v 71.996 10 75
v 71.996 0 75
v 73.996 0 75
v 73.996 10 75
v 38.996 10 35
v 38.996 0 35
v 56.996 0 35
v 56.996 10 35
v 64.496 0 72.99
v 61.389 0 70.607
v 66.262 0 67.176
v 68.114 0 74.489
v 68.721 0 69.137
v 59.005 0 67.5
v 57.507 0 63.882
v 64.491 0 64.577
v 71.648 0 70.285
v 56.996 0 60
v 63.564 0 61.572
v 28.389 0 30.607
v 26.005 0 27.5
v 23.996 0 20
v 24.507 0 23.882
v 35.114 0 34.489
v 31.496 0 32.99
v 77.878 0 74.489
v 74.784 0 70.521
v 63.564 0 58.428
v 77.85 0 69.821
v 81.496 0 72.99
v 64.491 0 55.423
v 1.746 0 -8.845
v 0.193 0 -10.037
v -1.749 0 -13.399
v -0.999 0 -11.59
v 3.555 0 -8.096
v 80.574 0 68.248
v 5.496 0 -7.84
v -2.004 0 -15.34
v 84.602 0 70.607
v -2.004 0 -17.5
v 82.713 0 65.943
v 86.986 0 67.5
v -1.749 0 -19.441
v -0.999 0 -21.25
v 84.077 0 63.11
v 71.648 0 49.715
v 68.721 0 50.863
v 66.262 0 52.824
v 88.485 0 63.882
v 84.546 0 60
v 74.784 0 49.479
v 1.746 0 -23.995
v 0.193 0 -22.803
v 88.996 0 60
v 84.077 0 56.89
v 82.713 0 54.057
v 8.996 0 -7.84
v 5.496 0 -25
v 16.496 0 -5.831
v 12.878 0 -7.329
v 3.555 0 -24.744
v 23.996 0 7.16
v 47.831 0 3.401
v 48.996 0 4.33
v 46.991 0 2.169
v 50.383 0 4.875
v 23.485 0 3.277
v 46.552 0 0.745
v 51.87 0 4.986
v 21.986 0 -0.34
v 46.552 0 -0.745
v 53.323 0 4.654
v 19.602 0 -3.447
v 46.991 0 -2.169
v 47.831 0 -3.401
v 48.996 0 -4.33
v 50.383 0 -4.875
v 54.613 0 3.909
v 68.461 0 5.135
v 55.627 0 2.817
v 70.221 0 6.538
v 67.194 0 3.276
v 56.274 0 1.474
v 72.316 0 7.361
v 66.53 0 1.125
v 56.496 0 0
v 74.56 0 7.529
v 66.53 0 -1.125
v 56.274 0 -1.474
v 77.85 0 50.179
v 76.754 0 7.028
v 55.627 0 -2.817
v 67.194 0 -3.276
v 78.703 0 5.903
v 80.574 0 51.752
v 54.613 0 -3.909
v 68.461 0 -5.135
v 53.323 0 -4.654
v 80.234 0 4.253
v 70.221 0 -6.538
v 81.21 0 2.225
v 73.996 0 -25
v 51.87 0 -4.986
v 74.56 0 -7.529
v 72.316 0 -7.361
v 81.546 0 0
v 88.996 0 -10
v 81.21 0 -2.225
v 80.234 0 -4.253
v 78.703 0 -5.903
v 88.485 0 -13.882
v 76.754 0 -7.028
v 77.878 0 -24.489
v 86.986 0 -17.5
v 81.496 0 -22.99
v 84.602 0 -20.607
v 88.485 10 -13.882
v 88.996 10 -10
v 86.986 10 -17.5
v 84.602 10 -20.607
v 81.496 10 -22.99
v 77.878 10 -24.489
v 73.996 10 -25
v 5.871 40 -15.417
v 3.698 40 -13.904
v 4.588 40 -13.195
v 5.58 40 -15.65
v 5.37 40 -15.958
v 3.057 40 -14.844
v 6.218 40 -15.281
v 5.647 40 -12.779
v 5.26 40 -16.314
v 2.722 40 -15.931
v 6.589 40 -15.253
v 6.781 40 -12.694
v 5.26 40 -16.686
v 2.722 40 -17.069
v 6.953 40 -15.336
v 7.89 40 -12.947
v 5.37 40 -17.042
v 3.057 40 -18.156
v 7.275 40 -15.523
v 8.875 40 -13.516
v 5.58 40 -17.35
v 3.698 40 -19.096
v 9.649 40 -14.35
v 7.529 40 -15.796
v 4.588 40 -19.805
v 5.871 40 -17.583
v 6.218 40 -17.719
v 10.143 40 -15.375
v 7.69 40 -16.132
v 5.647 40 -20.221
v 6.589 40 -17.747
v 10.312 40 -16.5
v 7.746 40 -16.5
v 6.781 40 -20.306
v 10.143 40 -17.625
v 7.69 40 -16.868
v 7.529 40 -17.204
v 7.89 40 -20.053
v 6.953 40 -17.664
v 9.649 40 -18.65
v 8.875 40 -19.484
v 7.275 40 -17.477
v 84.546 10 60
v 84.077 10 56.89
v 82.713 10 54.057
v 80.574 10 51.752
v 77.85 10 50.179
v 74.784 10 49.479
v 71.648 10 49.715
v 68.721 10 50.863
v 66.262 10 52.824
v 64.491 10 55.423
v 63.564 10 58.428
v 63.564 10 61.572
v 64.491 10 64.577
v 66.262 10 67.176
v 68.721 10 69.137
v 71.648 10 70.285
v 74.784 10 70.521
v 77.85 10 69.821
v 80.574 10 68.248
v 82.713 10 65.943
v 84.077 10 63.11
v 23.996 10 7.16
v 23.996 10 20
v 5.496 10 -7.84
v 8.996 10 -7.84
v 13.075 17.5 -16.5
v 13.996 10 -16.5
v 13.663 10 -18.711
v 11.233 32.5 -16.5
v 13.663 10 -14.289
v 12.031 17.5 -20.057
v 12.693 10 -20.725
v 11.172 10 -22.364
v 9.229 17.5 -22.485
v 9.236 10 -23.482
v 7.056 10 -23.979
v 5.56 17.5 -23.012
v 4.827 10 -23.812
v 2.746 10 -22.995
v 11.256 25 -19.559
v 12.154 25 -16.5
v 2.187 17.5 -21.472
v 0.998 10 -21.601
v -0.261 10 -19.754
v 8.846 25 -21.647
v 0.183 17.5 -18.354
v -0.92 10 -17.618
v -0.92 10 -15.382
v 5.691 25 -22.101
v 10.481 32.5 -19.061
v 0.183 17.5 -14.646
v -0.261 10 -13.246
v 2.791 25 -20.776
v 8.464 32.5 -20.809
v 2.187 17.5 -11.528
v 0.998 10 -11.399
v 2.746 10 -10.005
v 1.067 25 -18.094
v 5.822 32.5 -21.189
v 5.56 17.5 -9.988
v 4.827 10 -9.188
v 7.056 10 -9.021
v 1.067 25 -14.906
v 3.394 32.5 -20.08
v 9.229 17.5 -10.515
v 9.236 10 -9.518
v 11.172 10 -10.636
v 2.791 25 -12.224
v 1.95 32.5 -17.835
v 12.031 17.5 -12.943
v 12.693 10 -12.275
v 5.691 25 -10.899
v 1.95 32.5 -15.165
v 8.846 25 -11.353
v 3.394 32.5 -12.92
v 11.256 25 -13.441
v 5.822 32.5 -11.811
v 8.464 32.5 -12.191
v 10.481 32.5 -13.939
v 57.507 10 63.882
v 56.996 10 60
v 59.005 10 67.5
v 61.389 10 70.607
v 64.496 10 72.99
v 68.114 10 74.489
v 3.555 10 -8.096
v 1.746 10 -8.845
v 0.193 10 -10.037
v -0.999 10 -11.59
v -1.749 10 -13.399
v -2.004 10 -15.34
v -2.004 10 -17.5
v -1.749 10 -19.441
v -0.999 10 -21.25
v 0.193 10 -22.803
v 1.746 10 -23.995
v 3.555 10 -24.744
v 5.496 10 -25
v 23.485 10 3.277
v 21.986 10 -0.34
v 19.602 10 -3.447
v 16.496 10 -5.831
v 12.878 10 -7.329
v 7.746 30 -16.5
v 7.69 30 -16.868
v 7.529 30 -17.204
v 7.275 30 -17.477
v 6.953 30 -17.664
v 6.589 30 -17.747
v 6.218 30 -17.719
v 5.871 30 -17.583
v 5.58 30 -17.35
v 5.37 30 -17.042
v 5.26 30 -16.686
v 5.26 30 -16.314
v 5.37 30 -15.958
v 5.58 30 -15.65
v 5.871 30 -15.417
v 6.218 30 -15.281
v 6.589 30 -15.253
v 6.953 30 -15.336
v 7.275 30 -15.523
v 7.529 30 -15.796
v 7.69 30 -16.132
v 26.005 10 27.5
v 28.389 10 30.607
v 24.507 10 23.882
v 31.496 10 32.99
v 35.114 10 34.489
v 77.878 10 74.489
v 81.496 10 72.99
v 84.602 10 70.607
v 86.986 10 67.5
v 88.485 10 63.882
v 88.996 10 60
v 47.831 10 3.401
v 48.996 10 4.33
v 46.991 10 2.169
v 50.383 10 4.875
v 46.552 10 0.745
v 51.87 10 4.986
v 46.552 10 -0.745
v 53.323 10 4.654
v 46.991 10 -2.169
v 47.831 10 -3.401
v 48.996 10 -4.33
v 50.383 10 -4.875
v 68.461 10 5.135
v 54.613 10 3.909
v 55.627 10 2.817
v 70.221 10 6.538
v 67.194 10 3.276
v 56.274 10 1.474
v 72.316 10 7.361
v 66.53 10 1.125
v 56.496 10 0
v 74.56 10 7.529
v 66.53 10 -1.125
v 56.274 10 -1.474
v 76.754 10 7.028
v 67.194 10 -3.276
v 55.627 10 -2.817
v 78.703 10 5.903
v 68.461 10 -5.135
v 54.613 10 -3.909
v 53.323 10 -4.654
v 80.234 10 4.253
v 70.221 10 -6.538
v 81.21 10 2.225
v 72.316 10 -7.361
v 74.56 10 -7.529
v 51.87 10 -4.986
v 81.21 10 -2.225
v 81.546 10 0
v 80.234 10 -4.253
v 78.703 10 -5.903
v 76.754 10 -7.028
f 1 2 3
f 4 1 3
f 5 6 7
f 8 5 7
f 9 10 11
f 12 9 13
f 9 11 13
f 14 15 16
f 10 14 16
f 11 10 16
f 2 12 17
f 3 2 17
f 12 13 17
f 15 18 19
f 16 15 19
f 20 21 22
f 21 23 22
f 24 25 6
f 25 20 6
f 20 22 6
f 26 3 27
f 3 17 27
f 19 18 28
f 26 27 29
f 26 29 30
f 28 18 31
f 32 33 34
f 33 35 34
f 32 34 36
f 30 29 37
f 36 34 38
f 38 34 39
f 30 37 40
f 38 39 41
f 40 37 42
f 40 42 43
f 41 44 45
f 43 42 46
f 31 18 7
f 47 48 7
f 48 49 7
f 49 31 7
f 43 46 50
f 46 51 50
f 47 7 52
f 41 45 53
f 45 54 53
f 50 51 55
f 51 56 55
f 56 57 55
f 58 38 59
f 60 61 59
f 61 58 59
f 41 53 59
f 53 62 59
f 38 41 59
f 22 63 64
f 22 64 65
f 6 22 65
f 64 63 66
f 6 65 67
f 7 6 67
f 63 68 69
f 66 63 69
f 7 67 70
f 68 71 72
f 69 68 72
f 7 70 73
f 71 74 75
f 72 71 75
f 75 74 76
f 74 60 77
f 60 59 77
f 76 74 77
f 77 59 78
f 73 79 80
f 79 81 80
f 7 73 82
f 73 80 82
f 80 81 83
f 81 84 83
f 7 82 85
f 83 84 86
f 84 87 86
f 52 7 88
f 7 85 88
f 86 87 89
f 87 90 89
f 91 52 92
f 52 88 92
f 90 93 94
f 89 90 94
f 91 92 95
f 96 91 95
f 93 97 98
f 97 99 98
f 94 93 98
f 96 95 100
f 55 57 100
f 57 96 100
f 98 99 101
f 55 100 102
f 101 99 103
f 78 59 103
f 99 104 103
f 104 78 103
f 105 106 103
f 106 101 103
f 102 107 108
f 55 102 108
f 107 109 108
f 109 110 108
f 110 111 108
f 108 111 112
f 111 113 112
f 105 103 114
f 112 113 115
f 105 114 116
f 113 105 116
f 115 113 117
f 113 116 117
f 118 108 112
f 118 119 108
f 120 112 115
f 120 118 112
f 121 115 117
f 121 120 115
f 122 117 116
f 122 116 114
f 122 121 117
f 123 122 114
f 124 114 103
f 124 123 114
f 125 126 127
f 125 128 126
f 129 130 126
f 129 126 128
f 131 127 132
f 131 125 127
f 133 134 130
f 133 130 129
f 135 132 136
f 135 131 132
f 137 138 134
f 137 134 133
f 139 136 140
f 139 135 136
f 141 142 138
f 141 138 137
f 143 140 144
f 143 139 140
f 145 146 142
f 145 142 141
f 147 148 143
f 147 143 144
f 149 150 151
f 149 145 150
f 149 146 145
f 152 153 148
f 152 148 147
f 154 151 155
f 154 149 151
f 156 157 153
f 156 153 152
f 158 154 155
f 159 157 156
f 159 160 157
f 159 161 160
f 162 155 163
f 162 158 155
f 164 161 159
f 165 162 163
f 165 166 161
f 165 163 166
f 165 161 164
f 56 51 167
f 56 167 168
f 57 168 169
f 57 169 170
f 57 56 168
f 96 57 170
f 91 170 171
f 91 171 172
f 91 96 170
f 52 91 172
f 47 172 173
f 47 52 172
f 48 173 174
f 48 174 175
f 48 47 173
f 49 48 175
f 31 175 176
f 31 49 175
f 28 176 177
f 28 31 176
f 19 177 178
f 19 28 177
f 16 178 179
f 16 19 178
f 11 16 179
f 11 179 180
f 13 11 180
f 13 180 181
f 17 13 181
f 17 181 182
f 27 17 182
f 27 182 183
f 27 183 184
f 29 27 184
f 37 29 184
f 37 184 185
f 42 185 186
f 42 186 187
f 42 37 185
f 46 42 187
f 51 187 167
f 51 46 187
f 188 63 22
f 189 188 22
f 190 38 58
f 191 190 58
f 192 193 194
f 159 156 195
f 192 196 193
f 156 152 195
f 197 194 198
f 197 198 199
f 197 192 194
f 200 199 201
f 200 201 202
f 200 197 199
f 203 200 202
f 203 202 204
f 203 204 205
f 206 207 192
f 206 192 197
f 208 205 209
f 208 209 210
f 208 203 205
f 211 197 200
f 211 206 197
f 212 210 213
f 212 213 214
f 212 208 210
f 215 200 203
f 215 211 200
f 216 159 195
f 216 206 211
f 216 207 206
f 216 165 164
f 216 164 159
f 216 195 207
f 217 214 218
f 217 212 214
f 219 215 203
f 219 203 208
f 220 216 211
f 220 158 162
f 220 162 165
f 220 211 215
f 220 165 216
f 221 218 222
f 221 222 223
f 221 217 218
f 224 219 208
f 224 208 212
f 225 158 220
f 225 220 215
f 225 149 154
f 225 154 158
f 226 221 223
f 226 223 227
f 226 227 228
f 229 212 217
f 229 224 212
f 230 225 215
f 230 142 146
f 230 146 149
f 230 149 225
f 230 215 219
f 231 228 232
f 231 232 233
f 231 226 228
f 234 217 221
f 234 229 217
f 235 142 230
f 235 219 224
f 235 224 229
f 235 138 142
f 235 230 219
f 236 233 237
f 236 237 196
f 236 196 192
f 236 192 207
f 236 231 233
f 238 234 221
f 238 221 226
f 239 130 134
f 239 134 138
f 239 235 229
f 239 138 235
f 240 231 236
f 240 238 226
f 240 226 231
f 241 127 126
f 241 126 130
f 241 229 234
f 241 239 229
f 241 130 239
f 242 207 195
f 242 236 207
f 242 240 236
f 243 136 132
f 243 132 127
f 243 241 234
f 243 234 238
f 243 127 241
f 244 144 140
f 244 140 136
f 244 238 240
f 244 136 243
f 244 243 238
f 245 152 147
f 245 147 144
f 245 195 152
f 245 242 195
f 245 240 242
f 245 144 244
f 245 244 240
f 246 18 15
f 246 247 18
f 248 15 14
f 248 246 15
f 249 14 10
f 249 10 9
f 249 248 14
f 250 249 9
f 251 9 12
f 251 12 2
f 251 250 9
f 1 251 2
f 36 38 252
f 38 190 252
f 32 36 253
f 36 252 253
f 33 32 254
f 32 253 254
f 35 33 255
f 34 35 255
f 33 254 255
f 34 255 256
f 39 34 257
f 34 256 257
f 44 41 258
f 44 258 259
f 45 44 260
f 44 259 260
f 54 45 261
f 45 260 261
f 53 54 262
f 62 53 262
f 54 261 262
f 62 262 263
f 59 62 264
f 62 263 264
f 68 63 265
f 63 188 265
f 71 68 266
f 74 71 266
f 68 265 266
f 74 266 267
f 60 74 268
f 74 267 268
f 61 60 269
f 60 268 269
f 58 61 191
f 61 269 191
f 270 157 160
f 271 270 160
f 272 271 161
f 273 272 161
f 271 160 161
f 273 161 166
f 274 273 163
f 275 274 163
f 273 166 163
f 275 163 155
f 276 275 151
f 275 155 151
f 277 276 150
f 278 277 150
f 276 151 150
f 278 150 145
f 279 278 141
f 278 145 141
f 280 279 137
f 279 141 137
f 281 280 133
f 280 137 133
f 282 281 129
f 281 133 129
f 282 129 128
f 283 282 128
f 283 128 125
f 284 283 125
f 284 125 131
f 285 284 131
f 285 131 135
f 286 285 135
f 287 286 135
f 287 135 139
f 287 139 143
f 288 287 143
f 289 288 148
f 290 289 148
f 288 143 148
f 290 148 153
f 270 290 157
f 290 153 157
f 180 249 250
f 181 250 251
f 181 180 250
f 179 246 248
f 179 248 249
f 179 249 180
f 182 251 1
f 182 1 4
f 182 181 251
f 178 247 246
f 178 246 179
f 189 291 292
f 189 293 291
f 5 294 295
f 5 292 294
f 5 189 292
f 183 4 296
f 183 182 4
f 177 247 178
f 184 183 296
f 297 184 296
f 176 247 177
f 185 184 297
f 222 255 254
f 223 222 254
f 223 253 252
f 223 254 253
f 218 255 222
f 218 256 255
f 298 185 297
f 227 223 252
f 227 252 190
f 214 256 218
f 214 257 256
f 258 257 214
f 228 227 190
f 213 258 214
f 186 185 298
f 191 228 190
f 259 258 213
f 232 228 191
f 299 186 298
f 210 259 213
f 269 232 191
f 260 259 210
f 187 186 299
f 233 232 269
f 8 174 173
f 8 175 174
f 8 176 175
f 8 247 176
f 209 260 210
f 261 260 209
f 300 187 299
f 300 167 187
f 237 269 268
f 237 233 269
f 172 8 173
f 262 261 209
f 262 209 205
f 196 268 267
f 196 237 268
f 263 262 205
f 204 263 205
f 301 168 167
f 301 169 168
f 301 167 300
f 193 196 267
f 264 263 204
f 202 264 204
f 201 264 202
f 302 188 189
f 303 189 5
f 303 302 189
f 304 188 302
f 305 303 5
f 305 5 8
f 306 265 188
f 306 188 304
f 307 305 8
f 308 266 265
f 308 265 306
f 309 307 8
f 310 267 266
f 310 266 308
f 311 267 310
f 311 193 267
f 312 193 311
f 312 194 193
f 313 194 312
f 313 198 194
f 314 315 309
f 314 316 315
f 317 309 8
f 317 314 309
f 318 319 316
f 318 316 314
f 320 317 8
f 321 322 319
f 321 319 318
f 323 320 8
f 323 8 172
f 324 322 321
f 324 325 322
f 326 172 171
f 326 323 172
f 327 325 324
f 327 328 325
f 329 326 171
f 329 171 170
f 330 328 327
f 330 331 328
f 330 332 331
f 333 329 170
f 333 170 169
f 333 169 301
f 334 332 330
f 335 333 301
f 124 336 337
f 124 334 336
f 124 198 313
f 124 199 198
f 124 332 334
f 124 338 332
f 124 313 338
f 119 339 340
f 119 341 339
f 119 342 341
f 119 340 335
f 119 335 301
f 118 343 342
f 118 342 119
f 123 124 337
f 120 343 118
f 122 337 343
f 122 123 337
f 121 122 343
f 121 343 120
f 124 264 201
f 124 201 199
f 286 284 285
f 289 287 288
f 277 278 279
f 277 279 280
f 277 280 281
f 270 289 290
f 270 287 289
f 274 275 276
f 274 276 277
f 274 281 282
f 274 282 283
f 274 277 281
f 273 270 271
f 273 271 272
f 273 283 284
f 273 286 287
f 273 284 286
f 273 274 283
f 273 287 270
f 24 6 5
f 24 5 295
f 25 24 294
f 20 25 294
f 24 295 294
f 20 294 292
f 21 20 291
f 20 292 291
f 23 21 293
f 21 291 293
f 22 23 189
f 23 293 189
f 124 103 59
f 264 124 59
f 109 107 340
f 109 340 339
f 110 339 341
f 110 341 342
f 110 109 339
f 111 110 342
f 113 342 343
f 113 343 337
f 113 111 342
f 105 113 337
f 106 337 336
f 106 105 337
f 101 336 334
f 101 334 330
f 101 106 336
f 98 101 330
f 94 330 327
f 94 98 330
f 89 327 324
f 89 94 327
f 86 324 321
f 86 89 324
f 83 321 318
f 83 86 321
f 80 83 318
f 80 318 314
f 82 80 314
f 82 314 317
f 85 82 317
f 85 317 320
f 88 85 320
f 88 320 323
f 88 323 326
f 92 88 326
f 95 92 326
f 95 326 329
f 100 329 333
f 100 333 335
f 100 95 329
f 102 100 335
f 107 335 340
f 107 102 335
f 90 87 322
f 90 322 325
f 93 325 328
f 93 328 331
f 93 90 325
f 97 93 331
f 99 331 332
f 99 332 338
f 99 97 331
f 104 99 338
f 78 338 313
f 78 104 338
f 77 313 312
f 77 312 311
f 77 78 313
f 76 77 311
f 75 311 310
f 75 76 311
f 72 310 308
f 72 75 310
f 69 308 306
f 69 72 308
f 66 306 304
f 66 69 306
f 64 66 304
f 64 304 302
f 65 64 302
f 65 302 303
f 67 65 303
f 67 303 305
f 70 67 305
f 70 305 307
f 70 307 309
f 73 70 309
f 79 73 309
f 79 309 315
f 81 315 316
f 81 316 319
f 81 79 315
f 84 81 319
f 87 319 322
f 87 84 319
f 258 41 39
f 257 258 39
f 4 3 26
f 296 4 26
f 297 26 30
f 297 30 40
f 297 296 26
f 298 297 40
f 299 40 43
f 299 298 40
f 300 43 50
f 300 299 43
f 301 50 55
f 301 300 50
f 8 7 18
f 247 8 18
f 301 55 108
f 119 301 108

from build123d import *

# Parameters (mm, degrees)
SKETCH1_R           = 7.55
SKETCH1_R_2         = 5
SKETCH1_R_3         = 10.55
BOSS_EXTRUDE1_DEPTH = 10
SKETCH4_R           = 7.5
BOSS_EXTRUDE2_DEPTH = 30
BOSS_EXTRUDE2_TAPER = 7
SKETCH5_R           = 1.25
CUT_EXTRUDE2_DEPTH  = 10
FILLET1_R           = 15
FILLET2_R           = 7.5


with BuildPart() as part:
    # Sketch1 → Boss-Extrude1 (new body)
    with BuildSketch(Plane(origin=(0, 0, 0), x_dir=(1, 0, 0), z_dir=(0, 1, 0))):
        Polygon((23.995878661, -35), (56.995878661, -35), (56.995878661, -75), (88.995878661, -75), (88.995878661, -25), (88.995878661, 25), (17.5, 25), (-2.004121339, 25), (-2.004121339, 7.840472806), (23.995878661, 7.840472806), (23.995878661, 0), align=None)
        with Locations((73.995878661, 0)):
            Circle(SKETCH1_R, mode=Mode.SUBTRACT)
        with Locations((51.495878661, 0)):
            Circle(SKETCH1_R_2, mode=Mode.SUBTRACT)
        with Locations((73.995878661, -60)):
            Circle(SKETCH1_R_3, mode=Mode.SUBTRACT)
    extrude(amount=BOSS_EXTRUDE1_DEPTH)

    # Sketch4 → Boss-Extrude2 (add)
    with BuildSketch(Plane(origin=(0, 10, 0), x_dir=(1, 0, 0), z_dir=(0, 1, 0))):
        with Locations((6.495878661, 16.5)):
            Circle(SKETCH4_R)
    extrude(amount=BOSS_EXTRUDE2_DEPTH, taper=BOSS_EXTRUDE2_TAPER)

    # Sketch5 → Cut-Extrude2 (cut)
    with BuildSketch(Plane(origin=(0, 40, 0), x_dir=(1, 0, 0), z_dir=(0, 1, 0))):
        with Locations((6.495878661, 16.5)):
            Circle(SKETCH5_R)
    extrude(amount=-CUT_EXTRUDE2_DEPTH, mode=Mode.SUBTRACT)

    # Fillet1
    fillet1_edges = [part.edges().sort_by_distance(p)[0] for p in [
        (88.995878661, 5, -25),
        (88.995878661, 5, 75),
        (56.995878661, 5, 75),
        (23.995878661, 5, 35),
        (23.995878661, 5, -7.840472806),
    ]]
    fillet(fillet1_edges, radius=FILLET1_R)

    # Fillet2
    fillet2_edges = [part.edges().sort_by_distance(p)[0] for p in [
        (-2.004121339, 5, -7.840472806),
        (-2.004121339, 5, -25),
    ]]
    fillet(fillet2_edges, radius=FILLET2_R)


solid = part.part
